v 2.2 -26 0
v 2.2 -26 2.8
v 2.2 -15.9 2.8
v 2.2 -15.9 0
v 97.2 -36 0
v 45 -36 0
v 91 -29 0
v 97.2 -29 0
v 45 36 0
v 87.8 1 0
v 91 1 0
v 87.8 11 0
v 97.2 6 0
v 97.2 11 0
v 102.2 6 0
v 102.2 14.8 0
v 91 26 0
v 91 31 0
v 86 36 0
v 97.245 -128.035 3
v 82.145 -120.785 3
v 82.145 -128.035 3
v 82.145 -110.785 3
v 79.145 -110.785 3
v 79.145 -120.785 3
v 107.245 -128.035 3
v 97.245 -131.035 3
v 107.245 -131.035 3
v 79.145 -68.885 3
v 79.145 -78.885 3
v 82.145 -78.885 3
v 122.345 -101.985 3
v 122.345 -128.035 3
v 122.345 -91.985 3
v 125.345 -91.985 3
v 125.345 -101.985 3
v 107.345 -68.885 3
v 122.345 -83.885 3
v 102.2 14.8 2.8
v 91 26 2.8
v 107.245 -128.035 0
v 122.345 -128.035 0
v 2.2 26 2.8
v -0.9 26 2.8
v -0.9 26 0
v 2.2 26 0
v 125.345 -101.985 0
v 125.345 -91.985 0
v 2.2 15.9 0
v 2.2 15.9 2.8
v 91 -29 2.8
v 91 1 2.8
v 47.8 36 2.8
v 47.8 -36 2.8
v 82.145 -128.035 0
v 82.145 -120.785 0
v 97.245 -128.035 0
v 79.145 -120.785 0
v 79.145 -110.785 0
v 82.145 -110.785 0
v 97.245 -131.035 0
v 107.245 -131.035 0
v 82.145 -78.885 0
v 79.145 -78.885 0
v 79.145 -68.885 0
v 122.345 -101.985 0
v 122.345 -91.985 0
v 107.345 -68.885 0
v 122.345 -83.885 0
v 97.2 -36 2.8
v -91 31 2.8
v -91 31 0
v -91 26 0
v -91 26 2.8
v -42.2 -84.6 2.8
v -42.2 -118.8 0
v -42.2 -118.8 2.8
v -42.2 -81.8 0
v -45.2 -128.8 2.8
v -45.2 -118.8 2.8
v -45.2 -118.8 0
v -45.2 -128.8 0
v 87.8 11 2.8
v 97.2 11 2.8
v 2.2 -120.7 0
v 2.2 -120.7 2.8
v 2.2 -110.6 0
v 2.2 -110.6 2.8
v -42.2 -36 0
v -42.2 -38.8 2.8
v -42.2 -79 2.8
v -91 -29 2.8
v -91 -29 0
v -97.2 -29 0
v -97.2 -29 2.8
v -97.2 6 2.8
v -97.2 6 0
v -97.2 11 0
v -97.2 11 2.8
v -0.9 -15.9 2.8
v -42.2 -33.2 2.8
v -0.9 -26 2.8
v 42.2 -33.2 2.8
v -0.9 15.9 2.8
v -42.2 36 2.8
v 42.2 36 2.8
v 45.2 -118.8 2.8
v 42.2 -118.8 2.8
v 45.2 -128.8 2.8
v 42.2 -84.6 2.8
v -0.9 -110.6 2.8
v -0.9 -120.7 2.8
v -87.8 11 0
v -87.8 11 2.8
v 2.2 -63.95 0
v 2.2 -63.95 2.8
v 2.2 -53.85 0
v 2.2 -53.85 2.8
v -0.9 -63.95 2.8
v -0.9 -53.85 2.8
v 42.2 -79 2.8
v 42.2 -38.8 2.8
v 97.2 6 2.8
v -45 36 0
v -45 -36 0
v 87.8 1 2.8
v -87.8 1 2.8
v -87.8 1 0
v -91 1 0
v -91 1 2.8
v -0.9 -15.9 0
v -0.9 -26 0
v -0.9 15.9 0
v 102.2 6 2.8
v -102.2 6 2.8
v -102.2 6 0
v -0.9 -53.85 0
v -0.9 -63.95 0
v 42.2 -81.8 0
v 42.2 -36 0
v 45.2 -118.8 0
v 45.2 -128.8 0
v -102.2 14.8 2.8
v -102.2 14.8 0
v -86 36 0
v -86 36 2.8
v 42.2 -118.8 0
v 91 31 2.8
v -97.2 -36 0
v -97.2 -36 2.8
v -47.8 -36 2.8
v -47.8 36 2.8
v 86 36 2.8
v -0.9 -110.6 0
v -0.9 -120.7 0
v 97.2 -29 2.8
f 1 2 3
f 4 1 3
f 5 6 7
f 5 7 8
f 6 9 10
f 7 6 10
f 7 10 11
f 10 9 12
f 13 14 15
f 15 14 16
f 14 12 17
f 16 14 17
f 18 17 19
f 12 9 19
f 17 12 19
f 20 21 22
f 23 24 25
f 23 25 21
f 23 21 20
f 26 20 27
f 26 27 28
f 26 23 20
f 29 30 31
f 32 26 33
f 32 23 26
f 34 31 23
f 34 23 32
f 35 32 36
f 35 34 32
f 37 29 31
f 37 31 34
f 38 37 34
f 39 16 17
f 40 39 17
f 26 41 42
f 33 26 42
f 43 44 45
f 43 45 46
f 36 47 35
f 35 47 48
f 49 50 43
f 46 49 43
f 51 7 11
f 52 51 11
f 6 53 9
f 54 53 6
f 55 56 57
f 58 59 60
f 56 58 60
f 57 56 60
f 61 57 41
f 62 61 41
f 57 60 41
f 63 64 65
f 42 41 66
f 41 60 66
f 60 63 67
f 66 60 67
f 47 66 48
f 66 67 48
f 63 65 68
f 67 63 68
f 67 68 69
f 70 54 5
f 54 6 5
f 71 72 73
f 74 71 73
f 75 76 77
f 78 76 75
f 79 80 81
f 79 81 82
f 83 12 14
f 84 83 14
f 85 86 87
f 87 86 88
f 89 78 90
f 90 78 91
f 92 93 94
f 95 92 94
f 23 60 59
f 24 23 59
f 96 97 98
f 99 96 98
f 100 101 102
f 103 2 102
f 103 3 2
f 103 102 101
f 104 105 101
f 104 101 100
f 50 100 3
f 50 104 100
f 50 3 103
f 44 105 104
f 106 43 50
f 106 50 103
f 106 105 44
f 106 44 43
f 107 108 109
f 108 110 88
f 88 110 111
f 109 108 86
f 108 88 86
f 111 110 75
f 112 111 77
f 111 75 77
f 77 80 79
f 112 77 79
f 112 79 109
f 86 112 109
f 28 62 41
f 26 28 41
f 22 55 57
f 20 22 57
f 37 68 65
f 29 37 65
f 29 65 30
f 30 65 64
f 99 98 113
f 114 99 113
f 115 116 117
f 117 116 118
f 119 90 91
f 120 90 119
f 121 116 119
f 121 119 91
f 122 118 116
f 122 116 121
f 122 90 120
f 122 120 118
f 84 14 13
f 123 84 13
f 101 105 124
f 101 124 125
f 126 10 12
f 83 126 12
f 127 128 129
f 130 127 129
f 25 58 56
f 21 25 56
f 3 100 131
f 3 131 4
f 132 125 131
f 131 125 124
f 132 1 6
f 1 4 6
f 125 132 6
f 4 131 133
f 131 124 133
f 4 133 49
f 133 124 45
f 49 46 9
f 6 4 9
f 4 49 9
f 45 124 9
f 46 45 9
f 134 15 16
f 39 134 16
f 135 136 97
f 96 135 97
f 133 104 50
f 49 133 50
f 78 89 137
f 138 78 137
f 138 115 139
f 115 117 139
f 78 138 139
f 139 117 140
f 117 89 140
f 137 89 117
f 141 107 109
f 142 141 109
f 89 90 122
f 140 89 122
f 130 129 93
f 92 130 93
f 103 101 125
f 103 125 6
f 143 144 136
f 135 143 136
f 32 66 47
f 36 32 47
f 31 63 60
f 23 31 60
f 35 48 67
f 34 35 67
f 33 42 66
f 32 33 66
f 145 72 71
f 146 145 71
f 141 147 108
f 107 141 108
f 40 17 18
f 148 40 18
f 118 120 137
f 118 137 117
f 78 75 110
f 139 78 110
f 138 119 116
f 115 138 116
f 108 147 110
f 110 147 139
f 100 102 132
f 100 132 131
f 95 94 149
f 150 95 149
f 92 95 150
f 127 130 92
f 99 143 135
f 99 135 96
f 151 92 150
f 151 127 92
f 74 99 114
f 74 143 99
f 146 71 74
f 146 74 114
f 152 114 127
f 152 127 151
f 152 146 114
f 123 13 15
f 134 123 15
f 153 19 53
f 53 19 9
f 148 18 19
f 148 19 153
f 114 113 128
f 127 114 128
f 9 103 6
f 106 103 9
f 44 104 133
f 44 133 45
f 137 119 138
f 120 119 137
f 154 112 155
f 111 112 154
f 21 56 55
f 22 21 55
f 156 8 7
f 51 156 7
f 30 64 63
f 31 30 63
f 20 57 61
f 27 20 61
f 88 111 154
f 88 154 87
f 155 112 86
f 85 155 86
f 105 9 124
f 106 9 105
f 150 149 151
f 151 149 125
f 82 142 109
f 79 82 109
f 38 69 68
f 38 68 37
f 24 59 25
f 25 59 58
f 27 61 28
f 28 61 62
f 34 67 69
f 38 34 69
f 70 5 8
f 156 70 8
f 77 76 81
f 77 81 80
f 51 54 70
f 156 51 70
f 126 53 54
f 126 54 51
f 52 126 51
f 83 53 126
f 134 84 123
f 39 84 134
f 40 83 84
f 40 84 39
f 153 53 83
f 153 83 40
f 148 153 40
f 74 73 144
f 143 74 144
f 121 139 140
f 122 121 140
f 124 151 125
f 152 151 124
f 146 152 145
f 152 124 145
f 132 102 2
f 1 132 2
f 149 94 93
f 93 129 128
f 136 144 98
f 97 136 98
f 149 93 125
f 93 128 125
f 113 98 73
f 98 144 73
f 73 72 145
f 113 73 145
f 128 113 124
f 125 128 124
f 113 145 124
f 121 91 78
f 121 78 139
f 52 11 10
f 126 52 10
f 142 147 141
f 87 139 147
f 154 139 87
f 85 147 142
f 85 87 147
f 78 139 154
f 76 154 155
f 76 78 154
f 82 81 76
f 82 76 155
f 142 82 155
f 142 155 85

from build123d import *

# Parameters (mm, degrees)
F1_DEPTH   = 2.8
F2_SIZE    = 2.79999
F2_2_SIZE  = 2.79999
F3_DEPTH   = 2.8
F4_SIZE    = 2.79999
F5_W       = 3.1
F5_H       = 10.1
F6_DEPTH   = 3
F0_W       = 84.4
F0_H       = 45.8
F7_DEPTH   = 2.8
F8_SIZE    = 2.79999
F0_H_2     = 47
F9_DEPTH   = 2.8
F10_SIZE   = 2.79999
F11_W      = 10
F11_H      = 2.8
F12_DEPTH  = 3
F15_W      = 3.1
F15_H      = 10.1
F14_W      = 3.1
F14_H      = 10.1
F16_DEPTH  = 4
F18_DEPTH  = 3
F19_SIZE   = 5
F19_2_SIZE = 5
F20_SIZE   = 15


# Not quite as in the source:
# - a fillet or chamfer is up to 0.001 mm smaller than in the source, because OpenCascade refuses the exact size


with BuildPart() as f1:
    # F0 (on Top) → F1 (new body)
    with BuildSketch(Plane.XY):
        Polygon((-45, -36), (-45, 36), (-91, 36), (-91, 26), (-102.2, 14.8), (-102.2, 6), (-97.2, 6), (-97.2, 11), (-91, 11), (-87.8, 11), (-87.8, 1), (-91, 1), (-91, -29), (-97.2, -29), (-97.2, -36), (-91, -36), align=None)
    extrude(amount=F1_DEPTH)

    # F2 (size 2.8 in the source; OpenCascade refuses exactly that, so slightly less here)
    f2_edges = [f1.edges().sort_by_distance(p)[0] for p in [
        (-45, 0, 2.8),
    ]]
    chamfer(f2_edges, length=F2_SIZE)

    # F19
    f19_edges = [f1.edges().sort_by_distance(p)[0] for p in [
        (-91, 36, 1.4),
    ]]
    chamfer(f19_edges, length=F19_SIZE)


with BuildPart() as f1b:
    # F0 (on Top) → F1, piece 2 (new body)
    with BuildSketch(Plane.XY):
        Polygon((45, 36), (45, -36), (91, -36), (97.2, -36), (97.2, -29), (91, -29), (91, 1), (87.8, 1), (87.8, 11), (91, 11), (97.2, 11), (97.2, 6), (102.2, 6), (102.2, 14.8), (91, 26), (91, 36), align=None)
    extrude(amount=F1_DEPTH)

    # F2#2 (size 2.8 in the source; OpenCascade refuses exactly that, so slightly less here)
    f2_2_edges = [f1b.edges().sort_by_distance(p)[0] for p in [
        (45, 0, 2.8),
    ]]
    chamfer(f2_2_edges, length=F2_2_SIZE)

    # F19#2
    f19_2_edges = [f1b.edges().sort_by_distance(p)[0] for p in [
        (91, 36, 1.4),
    ]]
    chamfer(f19_2_edges, length=F19_2_SIZE)


with BuildPart() as f3:
    # F0 (on Top) → F3 (new body)
    with BuildSketch(Plane.XY):
        Polygon((42.2, -36), (45, -36), (45, 36), (-45, 36), (-45, -36), (-42.2, -36), align=None)
    extrude(amount=F3_DEPTH)

    # F4 (size 2.8 in the source; OpenCascade refuses exactly that, so slightly less here)
    f4_edges = [f3.edges().sort_by_distance(p)[0] for p in [
        (45, 0, 2.8),
        (-45, 0, 2.8),
        (0, -36, 2.8),
    ]]
    chamfer(f4_edges, length=F4_SIZE)

    # F5 (on face) → F6 (cut)
    with BuildSketch(Plane.XY.offset(2.8)):
        with Locations((0.65, 20.95)):
            Rectangle(F5_W, F5_H)
        with Locations((0.65, -20.95)):
            Rectangle(F5_W, F5_H)
    extrude(amount=-F6_DEPTH, mode=Mode.SUBTRACT)


with BuildPart() as f7:
    # F0 (on Top) → F7 (new body)
    with BuildSketch(Plane.XY):
        with Locations((0, -58.9)):
            Rectangle(F0_W, F0_H)
    extrude(amount=F7_DEPTH)

    # F8 (size 2.8 in the source; OpenCascade refuses exactly that, so slightly less here)
    f8_edges = [f7.edges().sort_by_distance(p)[0] for p in [
        (0, -36, 2.8),
        (0, -81.8, 2.8),
    ]]
    chamfer(f8_edges, length=F8_SIZE)


with BuildPart() as f9:
    # F0 (on Top) → F9 (new body)
    with BuildSketch(Plane.XY):
        with Locations((0, -105.3)):
            Rectangle(F0_W, F0_H_2)
    extrude(amount=F9_DEPTH)

    # F10 (size 2.8 in the source; OpenCascade refuses exactly that, so slightly less here)
    f10_edges = [f9.edges().sort_by_distance(p)[0] for p in [
        (0, -81.8, 2.8),
    ]]
    chamfer(f10_edges, length=F10_SIZE)

    # F11 (on face) → F12 (join)
    with BuildSketch(Plane(origin=(-42.2, 0, 0), x_dir=(0, -1, 0), z_dir=(-1, 0, 0))):
        with Locations((123.8, 1.4)):
            Rectangle(F11_W, F11_H)
    extrude(amount=F12_DEPTH)

    # F13: F9 across plane


with BuildPart() as f9_1:
    add(f9.part)
    add(f9.part.mirror(Plane.YZ))


with BuildPart() as f16_tool:
    # F15 (on face) + F14 (on face) → F16 (new body)
    with BuildSketch(Plane.XY.offset(2.8)):
        with Locations((0.65, -115.65)):
            Rectangle(F15_W, F15_H)
    with BuildSketch(Plane.XY.offset(2.8)):
        with Locations((0.65, -58.9)):
            Rectangle(F14_W, F14_H)
    extrude(amount=-F16_DEPTH)


with BuildPart() as f7_1:
    add(f7.part)

    # F16: cut by f16_tool
    add(f16_tool.part, mode=Mode.SUBTRACT)


with BuildPart() as f9_2:
    add(f9_1.part)

    # F16: cut by f16_tool
    add(f16_tool.part, mode=Mode.SUBTRACT)


with BuildPart() as f18:
    # F17 (on Top) → F18 (new body)
    with BuildSketch(Plane.XY):
        Polygon((122.3451334953, -68.8853332162), (82.1451334953, -68.8853332162), (79.1451334953, -68.8853332162), (79.1451334953, -78.8853332162), (82.1451334953, -78.8853332162), (82.1451334953, -110.7853332162), (79.1451334953, -110.7853332162), (79.1451334953, -120.7853332162), (82.1451334953, -120.7853332162), (82.1451334953, -128.0353332162), (97.2451334953, -128.0353332162), (97.2451334953, -131.0353332162), (102.2451334953, -131.0353332162), (107.2451334953, -131.0353332162), (107.2451334953, -128.0353332162), (122.3451334953, -128.0353332162), (122.3451334953, -101.9853332162), (125.3451334953, -101.9853332162), (125.3451334953, -91.9853332162), (122.3451334953, -91.9853332162), align=None)
    extrude(amount=F18_DEPTH)

    # F20
    f20_edges = [f18.edges().sort_by_distance(p)[0] for p in [
        (122.345133, -68.885333, 1.5),
    ]]
    chamfer(f20_edges, length=F20_SIZE)


solid = Compound([f1.part, f1b.part, f3.part, f7_1.part, f9_2.part, f18.part])
